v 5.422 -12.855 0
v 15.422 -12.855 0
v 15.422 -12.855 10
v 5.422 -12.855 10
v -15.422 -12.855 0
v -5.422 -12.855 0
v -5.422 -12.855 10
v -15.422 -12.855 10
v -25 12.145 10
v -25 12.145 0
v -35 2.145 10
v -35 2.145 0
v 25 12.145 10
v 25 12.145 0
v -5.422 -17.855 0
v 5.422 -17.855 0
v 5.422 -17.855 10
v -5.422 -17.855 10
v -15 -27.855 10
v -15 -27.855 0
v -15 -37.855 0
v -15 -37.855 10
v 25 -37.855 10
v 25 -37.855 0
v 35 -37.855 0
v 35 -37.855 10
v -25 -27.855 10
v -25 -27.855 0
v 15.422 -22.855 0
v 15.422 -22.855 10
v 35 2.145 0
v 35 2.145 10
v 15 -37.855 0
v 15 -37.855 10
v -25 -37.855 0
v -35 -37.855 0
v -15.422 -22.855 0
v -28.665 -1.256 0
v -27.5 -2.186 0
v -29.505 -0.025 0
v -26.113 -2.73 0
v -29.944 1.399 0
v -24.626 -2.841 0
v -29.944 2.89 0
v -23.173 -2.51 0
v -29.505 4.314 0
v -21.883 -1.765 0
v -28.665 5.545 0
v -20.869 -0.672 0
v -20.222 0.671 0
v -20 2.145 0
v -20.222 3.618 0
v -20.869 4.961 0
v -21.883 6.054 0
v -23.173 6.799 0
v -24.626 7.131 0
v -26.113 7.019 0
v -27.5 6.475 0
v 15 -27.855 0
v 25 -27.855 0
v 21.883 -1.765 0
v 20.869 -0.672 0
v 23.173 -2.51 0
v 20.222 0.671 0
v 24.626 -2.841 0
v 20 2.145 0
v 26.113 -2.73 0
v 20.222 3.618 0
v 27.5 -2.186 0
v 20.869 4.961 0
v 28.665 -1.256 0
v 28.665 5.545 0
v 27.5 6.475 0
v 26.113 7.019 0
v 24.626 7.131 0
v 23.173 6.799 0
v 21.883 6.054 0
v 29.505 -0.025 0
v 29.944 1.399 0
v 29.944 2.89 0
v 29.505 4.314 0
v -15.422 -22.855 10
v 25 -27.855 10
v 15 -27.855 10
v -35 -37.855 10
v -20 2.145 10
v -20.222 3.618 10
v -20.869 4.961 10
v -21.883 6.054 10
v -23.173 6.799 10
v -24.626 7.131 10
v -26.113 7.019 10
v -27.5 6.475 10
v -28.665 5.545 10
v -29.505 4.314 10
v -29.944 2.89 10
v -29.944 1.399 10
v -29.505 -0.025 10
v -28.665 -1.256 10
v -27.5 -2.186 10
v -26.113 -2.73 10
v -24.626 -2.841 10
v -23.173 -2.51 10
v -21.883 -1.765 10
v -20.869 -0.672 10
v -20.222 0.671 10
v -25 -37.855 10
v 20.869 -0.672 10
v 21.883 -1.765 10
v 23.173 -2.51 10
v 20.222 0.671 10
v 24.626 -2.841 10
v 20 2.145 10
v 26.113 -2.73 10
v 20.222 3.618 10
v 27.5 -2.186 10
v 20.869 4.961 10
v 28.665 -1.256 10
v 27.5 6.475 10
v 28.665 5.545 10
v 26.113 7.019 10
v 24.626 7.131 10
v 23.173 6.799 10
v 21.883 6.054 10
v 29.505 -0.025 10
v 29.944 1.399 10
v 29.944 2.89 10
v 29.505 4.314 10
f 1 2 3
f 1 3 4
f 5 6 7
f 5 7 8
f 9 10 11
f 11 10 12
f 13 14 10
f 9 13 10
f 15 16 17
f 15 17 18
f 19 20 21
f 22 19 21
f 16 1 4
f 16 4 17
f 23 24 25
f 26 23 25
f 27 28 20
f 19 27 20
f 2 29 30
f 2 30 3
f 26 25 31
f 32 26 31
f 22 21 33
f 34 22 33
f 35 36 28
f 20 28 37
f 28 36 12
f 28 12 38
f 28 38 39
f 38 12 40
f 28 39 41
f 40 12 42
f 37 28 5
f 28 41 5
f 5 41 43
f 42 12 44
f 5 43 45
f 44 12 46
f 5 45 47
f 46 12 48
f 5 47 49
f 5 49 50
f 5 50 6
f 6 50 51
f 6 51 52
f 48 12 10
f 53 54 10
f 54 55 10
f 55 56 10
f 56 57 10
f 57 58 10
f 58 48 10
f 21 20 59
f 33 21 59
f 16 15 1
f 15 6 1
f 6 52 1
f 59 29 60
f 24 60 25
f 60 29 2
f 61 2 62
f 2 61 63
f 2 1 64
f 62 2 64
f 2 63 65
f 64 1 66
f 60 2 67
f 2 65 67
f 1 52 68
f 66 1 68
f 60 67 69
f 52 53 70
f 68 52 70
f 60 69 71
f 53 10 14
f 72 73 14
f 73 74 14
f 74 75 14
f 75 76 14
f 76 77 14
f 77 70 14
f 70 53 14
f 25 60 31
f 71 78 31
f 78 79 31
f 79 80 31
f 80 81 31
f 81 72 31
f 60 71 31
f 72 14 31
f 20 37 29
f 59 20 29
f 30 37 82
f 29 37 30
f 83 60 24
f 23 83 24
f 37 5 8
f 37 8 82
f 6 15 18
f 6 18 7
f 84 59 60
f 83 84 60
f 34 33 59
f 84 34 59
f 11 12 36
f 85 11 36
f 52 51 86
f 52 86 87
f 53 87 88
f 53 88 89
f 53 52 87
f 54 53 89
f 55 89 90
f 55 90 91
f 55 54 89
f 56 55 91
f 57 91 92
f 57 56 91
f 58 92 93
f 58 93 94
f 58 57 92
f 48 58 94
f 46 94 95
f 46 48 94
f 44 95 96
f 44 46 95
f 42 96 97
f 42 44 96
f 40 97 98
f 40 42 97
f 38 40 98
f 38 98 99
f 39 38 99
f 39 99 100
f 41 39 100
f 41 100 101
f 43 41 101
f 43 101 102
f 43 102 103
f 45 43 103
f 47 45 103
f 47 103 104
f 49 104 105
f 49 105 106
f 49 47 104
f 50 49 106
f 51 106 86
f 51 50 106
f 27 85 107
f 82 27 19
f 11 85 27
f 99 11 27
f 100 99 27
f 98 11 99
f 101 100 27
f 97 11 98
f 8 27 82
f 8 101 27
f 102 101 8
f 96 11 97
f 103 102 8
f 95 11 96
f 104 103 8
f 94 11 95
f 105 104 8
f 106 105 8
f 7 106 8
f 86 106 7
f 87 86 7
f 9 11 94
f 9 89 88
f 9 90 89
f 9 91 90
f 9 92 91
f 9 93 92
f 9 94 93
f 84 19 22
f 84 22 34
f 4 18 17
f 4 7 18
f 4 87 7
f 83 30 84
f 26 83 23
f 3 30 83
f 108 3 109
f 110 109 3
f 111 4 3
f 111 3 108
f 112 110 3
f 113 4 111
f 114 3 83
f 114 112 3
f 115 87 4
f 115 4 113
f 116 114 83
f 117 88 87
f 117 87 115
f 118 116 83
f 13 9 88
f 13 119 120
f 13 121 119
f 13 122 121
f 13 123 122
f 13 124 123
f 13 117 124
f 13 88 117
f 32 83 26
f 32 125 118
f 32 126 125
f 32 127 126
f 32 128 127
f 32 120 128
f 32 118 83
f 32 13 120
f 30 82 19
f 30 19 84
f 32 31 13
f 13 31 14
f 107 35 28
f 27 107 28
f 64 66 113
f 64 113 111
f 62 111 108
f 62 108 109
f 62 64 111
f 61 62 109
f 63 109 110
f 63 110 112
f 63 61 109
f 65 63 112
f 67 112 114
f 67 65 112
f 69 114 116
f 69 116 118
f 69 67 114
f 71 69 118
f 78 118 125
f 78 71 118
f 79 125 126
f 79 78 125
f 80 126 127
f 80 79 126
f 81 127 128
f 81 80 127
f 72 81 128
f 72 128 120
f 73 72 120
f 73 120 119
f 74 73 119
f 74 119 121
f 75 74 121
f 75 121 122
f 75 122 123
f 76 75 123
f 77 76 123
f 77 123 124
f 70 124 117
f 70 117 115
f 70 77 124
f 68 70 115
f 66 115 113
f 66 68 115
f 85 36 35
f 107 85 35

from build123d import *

# Parameters (mm, degrees)
SKETCH1_R           = 5
BOSS_EXTRUDE2_DEPTH = 10


with BuildPart() as part:
    # Sketch1 → Boss-Extrude2 (new body)
    with BuildSketch(Plane.XY):
        Polygon((25, 12.144578313), (-25, 12.144578313), (-35, 2.144578313), (-35, -37.855421687), (-25, -37.855421687), (-25, -27.855421687), (-15, -27.855421687), (-15, -37.855421687), (15, -37.855421687), (15, -27.855421687), (25, -27.855421687), (25, -37.855421687), (35, -37.855421687), (35, 2.144578313), align=None)
        with Locations((-25, 2.144578313)):
            Circle(SKETCH1_R, mode=Mode.SUBTRACT)
        with Locations(Location((25, 2.144578313, 0), (0, 0, 180))):
            Circle(SKETCH1_R, mode=Mode.SUBTRACT)
        Polygon((5.421686747, -17.855421687), (-5.421686747, -17.855421687), (-5.421686747, -12.855421687), (-15.421686747, -12.855421687), (-15.421686747, -22.855421687), (15.421686747, -22.855421687), (15.421686747, -12.855421687), (5.421686747, -12.855421687), align=None, mode=Mode.SUBTRACT)
    extrude(amount=BOSS_EXTRUDE2_DEPTH)


solid = part.part
